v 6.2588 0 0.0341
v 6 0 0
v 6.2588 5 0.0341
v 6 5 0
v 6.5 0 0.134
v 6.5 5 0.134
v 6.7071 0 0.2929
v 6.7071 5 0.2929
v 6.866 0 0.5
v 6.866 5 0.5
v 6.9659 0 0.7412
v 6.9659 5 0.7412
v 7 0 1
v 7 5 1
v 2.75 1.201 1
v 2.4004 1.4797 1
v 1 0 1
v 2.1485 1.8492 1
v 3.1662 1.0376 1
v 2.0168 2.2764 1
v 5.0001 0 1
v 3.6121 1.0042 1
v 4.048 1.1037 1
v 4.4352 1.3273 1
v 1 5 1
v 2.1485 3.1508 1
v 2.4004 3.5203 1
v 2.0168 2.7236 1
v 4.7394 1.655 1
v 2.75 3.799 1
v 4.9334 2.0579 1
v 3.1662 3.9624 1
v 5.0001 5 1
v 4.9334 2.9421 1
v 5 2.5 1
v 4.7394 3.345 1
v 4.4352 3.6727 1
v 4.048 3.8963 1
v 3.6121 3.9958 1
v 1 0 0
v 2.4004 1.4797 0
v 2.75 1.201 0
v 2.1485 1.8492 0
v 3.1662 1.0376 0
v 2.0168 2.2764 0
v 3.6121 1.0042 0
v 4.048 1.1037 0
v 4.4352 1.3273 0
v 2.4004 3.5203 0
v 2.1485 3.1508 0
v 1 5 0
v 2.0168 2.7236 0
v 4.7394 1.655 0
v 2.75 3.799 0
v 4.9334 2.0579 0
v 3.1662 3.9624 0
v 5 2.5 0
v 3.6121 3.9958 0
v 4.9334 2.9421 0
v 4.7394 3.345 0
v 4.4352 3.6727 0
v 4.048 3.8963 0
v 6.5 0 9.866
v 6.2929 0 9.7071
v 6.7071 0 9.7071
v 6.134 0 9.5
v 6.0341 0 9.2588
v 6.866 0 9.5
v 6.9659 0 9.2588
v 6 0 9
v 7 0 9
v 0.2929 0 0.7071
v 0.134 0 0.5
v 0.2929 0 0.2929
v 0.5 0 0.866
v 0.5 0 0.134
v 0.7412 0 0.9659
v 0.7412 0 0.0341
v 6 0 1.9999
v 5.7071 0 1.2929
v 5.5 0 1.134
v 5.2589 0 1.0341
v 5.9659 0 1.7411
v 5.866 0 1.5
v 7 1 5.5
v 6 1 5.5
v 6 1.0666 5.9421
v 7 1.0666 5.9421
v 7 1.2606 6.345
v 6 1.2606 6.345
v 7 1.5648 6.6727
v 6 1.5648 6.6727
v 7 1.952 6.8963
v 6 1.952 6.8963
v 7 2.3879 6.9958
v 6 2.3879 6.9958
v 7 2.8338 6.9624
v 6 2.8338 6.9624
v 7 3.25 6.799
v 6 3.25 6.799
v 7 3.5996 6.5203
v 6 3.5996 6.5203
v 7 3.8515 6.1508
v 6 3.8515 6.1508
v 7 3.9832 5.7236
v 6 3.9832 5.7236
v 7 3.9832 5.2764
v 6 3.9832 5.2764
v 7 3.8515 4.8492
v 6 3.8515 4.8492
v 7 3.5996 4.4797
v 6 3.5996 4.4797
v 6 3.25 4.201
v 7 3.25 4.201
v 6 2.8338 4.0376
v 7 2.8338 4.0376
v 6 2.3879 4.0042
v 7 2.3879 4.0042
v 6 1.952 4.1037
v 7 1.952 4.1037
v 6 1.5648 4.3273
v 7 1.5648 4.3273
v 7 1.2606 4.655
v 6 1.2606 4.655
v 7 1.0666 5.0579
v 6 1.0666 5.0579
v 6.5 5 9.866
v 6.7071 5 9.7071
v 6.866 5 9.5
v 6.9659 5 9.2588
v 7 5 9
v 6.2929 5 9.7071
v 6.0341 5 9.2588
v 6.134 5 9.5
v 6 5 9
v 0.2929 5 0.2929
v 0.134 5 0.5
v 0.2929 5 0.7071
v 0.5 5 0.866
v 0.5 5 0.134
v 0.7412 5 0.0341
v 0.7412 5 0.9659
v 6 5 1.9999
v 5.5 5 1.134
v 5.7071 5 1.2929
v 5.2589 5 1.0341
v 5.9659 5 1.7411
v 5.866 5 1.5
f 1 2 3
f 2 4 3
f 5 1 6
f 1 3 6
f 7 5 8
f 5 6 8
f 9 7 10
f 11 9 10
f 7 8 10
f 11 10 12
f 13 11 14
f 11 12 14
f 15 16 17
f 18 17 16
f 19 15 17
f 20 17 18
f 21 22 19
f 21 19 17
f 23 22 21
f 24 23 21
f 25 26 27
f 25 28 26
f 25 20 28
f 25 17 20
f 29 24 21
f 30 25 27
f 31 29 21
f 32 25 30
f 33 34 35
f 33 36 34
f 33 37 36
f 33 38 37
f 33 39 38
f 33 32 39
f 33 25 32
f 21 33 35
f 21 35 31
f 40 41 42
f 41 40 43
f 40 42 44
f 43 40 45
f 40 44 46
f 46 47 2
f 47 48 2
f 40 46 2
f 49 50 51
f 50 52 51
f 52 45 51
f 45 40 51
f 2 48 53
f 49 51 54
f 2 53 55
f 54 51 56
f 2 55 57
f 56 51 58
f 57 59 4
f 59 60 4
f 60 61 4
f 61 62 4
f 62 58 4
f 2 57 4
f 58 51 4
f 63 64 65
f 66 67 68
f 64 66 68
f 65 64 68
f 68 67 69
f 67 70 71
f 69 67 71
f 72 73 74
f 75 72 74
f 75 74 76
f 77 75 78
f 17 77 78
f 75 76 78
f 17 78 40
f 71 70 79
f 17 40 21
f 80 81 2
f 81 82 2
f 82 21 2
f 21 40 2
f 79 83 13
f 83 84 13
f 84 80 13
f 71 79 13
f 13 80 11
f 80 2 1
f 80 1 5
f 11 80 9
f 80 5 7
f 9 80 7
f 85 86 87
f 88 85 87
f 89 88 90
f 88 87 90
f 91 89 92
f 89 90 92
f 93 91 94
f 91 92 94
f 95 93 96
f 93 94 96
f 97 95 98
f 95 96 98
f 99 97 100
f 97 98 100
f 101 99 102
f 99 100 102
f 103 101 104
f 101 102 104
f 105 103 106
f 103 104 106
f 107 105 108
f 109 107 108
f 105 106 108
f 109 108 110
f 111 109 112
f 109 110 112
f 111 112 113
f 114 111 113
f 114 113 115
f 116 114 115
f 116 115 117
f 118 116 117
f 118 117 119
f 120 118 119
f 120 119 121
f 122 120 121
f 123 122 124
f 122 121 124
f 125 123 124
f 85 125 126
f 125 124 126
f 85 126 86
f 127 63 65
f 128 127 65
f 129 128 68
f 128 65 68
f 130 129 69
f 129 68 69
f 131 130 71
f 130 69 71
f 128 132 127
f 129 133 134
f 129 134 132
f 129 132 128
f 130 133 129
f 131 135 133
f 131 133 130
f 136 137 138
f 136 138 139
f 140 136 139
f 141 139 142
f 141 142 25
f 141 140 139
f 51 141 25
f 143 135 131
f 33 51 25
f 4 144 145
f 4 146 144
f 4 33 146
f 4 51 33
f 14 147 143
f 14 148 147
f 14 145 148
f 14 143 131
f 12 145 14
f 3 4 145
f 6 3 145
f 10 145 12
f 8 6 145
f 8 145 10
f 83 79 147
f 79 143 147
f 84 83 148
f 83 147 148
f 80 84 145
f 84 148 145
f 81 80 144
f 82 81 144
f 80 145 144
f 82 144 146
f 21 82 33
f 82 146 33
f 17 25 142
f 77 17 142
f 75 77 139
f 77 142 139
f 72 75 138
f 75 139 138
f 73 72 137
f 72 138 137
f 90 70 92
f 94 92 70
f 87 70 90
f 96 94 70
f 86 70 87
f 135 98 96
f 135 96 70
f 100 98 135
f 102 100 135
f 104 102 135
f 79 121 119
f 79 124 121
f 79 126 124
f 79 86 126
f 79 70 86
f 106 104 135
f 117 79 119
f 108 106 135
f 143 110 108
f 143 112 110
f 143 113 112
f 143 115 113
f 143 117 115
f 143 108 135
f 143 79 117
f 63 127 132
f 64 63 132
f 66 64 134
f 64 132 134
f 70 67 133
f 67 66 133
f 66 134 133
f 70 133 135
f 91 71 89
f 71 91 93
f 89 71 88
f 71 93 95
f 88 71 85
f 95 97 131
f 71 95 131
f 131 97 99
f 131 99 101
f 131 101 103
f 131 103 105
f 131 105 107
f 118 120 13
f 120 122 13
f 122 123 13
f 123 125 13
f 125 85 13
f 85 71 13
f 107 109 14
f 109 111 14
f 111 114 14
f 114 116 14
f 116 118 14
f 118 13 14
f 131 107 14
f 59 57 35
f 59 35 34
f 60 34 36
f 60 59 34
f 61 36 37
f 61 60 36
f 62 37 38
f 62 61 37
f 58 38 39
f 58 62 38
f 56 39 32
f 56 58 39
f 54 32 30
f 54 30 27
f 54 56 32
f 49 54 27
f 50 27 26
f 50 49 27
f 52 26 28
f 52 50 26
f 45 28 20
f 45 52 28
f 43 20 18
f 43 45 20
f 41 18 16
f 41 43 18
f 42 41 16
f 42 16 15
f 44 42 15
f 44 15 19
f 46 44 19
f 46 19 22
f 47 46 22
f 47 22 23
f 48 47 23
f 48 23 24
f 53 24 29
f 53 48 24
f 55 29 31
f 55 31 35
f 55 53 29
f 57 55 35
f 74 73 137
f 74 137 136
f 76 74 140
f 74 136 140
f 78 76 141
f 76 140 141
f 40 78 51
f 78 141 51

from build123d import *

# Parameters (mm, degrees)
SKETCH1_W           = 7
SKETCH1_H           = 5
SKETCH1_R           = 1.5
BOSS_EXTRUDE1_DEPTH = 1
SKETCH2_W           = 1
SKETCH2_H           = 5
BOSS_EXTRUDE2_DEPTH = 9
SKETCH3_R           = 1.5
CUT_EXTRUDE1_DEPTH  = 1
FILLET1_R           = 1
FILLET2_R           = 1
FILLET3_R           = 1


# Some blends are built 0.0001 mm under size
with BuildPart() as part:
    # Sketch1 → Boss-Extrude1 (new body)
    with BuildSketch(Plane.XY):
        with Locations((3.5, 2.5)):
            Rectangle(SKETCH1_W, SKETCH1_H)
        with Locations((3.5, 2.5)):
            Circle(SKETCH1_R, mode=Mode.SUBTRACT)
    extrude(amount=BOSS_EXTRUDE1_DEPTH)

    # Sketch2 → Boss-Extrude2 (add)
    with BuildSketch(Plane.XY.offset(1)):
        with Locations((6.5, 2.5)):
            Rectangle(SKETCH2_W, SKETCH2_H)
    extrude(amount=BOSS_EXTRUDE2_DEPTH)

    # Sketch3 → Cut-Extrude1 (cut)
    with BuildSketch(Plane.ZY.offset(-6)):
        with Locations(Location((5.5, 2.5, 0), (0, 0, 270))):
            Circle(SKETCH3_R)
    extrude(amount=-CUT_EXTRUDE1_DEPTH, mode=Mode.SUBTRACT)

    # Fillet1
    fillet1_edges = [part.edges().sort_by_distance(p)[0] for p in [
        (6, 2.5, 1),
    ]]
    fillet(fillet1_edges, radius=FILLET1_R - 0.0001)  # a hair under: the kernel refuses the full size

    # Fillet2
    # the kernel refuses this fillet: 1 mm, written as the material it takes off along each edge
    with BuildSketch(Plane(origin=(7, -2.5, 10), x_dir=(-1, 0, 0), z_dir=(0, 1, 0)), Plane(origin=(0, 7.5, 0), x_dir=(0, 0, 1), z_dir=(0, -1, 0)), Plane(origin=(0, 7.5, 1), x_dir=(1, 0, 0), z_dir=(0, -1, 0))) as fillet2_piece_1:
        with BuildLine():
            CenterArc((FILLET2_R, -FILLET2_R), FILLET2_R, 90, 90)
            Line((0, -FILLET2_R), (0, 0))
            Line((0, 0), (FILLET2_R, 0))
        make_face()
    extrude(amount=10, mode=Mode.SUBTRACT)
    with BuildSketch(Plane(origin=(6, 7.5, 10), x_dir=(0, 0, -1), z_dir=(0, -1, 0))) as fillet2_piece_2:
        with BuildLine():
            CenterArc((FILLET2_R, FILLET2_R), FILLET2_R, 180, 90)
            Line((0, FILLET2_R), (0, 0))
            Line((0, 0), (FILLET2_R, 0))
        make_face()
    extrude(amount=10, mode=Mode.SUBTRACT)

    # Fillet3
    fillet3_edges = [part.edges().sort_by_distance(p)[0] for p in [
        (7, 2.5, 0),
    ]]
    fillet(fillet3_edges, radius=FILLET3_R)


solid = part.part
